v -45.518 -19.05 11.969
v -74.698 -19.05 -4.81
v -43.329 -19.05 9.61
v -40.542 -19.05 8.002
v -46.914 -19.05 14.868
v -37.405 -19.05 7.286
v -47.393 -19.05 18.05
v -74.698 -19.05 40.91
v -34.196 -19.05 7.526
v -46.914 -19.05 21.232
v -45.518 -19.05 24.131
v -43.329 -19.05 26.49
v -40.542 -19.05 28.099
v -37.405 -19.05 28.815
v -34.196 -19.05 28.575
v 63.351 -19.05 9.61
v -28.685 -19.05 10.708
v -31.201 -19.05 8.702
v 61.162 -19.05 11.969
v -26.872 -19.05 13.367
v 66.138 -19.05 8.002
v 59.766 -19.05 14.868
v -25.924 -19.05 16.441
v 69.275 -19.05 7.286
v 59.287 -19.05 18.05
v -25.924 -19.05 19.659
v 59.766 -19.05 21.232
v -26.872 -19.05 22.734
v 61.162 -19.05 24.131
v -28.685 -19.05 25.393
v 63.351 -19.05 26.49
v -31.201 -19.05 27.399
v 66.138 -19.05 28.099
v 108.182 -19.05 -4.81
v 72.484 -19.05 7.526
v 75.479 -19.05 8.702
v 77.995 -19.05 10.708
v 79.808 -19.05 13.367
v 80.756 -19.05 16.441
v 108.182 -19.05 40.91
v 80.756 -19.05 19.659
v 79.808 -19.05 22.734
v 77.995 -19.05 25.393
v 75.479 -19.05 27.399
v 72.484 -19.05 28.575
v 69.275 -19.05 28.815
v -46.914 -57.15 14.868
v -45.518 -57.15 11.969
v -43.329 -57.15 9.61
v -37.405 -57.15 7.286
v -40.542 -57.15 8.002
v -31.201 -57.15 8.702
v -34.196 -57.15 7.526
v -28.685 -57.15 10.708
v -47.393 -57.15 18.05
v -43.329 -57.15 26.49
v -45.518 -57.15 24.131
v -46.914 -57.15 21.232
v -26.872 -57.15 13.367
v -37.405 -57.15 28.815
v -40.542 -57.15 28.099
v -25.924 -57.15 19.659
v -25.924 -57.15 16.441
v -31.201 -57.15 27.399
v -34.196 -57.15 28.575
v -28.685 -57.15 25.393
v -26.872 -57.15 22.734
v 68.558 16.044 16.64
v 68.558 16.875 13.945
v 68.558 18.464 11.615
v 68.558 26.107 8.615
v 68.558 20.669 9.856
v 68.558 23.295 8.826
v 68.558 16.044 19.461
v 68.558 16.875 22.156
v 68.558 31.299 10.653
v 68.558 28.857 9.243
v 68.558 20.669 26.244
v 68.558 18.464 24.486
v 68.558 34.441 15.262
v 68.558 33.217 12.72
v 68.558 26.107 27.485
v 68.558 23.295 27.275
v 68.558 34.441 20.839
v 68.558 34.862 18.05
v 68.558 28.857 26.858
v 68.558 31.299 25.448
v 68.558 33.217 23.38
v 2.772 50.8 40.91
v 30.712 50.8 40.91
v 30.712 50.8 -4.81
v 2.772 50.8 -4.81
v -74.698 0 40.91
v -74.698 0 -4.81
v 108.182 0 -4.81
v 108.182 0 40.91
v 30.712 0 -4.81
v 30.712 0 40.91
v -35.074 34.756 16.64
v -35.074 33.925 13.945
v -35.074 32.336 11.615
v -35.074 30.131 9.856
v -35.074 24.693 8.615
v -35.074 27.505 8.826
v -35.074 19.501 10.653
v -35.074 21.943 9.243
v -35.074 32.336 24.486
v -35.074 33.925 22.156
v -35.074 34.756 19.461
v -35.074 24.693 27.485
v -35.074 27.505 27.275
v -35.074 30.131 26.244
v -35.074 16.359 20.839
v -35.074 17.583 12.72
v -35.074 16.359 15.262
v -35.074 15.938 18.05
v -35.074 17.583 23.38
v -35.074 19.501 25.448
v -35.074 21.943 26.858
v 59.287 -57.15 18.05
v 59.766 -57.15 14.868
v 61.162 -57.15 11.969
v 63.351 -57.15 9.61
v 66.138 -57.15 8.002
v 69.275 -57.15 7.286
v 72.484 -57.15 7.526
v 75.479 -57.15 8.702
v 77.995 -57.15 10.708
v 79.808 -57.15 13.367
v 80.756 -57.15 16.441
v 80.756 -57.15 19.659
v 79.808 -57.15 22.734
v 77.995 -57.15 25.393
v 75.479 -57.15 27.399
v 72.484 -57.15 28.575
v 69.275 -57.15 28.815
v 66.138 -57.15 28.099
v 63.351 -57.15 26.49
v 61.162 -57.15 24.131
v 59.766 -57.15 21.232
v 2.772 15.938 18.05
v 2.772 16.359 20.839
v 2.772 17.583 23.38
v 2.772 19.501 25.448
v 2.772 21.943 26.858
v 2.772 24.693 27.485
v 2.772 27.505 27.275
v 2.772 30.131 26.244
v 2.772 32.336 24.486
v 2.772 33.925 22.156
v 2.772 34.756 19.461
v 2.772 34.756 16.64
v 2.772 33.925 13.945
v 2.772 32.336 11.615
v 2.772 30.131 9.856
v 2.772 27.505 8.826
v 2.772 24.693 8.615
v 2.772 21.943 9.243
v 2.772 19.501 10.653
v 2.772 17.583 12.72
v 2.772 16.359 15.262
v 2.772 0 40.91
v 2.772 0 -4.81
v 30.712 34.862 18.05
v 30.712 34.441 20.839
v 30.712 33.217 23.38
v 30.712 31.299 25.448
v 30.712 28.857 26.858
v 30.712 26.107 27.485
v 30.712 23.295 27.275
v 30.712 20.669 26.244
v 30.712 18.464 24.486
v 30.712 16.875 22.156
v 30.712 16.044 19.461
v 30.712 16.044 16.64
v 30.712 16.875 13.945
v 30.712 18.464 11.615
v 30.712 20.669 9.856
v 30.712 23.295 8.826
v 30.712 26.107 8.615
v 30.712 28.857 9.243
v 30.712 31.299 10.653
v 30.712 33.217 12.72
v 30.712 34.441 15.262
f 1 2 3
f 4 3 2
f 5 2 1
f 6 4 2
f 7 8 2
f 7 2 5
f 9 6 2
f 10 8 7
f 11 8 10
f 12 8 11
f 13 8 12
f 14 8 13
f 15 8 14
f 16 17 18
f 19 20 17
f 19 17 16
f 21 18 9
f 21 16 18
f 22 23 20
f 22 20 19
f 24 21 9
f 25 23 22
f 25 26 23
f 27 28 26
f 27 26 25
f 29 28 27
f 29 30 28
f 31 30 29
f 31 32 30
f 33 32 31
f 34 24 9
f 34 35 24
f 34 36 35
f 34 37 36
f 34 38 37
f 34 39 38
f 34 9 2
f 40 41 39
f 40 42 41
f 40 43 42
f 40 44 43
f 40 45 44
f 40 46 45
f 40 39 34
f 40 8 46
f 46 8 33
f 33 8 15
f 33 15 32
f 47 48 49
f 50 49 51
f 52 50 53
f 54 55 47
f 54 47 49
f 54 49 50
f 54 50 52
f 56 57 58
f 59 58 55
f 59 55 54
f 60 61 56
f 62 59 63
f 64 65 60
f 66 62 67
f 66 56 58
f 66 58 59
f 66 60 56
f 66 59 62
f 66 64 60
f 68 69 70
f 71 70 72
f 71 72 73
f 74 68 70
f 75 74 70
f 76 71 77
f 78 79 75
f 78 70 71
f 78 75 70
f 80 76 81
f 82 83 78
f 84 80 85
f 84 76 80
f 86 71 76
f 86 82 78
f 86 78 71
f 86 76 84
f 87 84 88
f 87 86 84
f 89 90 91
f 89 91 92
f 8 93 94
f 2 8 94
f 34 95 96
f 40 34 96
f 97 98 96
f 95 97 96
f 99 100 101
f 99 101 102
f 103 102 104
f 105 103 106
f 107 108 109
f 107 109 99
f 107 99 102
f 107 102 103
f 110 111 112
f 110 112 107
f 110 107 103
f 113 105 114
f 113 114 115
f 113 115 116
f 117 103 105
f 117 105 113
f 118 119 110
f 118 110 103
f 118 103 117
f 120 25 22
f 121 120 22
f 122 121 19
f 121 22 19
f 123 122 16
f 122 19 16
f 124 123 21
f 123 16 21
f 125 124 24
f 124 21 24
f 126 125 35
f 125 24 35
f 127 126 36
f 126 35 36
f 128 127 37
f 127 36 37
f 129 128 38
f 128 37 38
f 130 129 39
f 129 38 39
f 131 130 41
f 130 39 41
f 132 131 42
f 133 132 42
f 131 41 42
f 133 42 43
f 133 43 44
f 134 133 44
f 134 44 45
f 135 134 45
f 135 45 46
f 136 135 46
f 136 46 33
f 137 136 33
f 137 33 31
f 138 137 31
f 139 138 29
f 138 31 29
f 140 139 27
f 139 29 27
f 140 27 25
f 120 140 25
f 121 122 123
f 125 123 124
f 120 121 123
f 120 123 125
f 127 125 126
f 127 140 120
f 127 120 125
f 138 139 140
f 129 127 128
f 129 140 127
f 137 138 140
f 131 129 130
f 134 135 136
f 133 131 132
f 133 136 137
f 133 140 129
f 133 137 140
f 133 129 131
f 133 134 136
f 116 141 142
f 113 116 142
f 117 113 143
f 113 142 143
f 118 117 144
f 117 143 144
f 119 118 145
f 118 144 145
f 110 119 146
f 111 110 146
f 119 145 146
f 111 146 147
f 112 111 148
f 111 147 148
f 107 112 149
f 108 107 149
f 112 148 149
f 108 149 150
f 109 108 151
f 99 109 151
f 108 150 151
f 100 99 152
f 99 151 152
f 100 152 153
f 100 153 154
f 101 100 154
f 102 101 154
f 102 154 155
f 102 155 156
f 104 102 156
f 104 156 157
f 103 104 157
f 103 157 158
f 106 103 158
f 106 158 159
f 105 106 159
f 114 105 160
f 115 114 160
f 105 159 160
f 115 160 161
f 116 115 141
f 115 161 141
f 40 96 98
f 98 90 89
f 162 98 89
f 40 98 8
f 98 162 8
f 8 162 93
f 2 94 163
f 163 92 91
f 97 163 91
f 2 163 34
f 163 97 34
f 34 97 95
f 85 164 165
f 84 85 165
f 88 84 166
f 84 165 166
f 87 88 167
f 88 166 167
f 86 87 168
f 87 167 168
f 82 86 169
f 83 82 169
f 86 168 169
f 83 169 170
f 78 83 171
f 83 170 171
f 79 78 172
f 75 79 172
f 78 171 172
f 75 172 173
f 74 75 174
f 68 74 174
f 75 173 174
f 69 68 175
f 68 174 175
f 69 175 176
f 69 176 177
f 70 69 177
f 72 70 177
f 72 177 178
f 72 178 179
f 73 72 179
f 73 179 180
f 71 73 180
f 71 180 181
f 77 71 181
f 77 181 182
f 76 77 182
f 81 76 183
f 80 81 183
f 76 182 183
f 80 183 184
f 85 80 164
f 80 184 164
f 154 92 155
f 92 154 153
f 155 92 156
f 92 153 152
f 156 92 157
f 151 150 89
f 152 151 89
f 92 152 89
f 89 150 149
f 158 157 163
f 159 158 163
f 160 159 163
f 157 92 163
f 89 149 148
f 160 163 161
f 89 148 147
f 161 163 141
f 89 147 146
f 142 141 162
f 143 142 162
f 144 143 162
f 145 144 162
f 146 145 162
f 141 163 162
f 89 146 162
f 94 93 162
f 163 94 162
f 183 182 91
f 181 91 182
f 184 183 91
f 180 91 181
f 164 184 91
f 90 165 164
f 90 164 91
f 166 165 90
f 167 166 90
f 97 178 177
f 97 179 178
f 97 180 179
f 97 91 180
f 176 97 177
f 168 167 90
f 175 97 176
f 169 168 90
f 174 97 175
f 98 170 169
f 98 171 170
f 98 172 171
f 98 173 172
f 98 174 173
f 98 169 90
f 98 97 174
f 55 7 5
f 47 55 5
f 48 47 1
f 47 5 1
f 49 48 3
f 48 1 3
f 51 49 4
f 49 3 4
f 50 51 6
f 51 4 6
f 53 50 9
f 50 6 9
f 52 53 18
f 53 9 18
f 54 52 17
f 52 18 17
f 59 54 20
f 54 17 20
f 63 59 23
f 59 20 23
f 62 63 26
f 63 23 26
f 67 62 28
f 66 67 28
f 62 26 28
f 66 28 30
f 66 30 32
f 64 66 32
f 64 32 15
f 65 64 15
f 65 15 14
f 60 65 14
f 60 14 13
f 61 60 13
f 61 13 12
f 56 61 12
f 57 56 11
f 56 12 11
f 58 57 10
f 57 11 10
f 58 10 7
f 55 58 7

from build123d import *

# Parameters (mm, degrees)
F0_W     = 27.94
F0_H     = 45.72
F1_DEPTH = 19.05
F2_W     = 27.94
F2_H     = 45.72
F3_DEPTH = 50.8
F5_R     = 9.4615
F6_DEPTH = 37.846
F7_DEPTH = 37.846
F9_DEPTH = 38.1


with BuildPart() as f1:
    # F0 (on Front) → F1 (new body)
    with BuildSketch(Plane.XZ):
        Polygon((-8.658381, 40.910337), (-74.698381, 40.910337), (-74.698381, -4.809663), (2.771619, -4.809663), (2.771619, 40.910337), align=None)
        with Locations((16.741619, 18.050337)):
            Rectangle(F0_W, F0_H)
        Polygon((42.141619, 40.910337), (30.711619, 40.910337), (30.711619, -4.809663), (108.181619, -4.809663), (108.181619, 40.910337), align=None)
    extrude(amount=F1_DEPTH)

    # F2 (on face) → F3 (join)
    with BuildSketch(Plane(origin=(0, 0, 0), x_dir=(-1, 0, 0), z_dir=(0, 1, 0))):
        with Locations((-16.741619, 18.050337)):
            Rectangle(F2_W, F2_H)
    extrude(amount=F3_DEPTH)

    # F5 (on face) → F6 (join)
    with BuildSketch(Plane.YZ.offset(30.711619)):
        with Locations((25.4, 18.050337)):
            Circle(F5_R)
    extrude(amount=F6_DEPTH)

    # F4 (on face) → F7 (join)
    with BuildSketch(Plane(origin=(2.771619, 0, 0), x_dir=(0, -1, 0), z_dir=(-1, 0, 0))):
        with BuildLine():
            ThreePointArc((-34.8615, 18.050337), (-25.4, 8.588837), (-15.9385, 18.050337))
            ThreePointArc((-15.9385, 18.050337), (-25.4, 27.511837), (-34.8615, 18.050337))
        make_face()
    extrude(amount=F7_DEPTH)

    # F8 (on face) → F9 (join)
    with BuildSketch(Plane.XZ.offset(19.05)):
        with BuildLine():
            Line((-47.393381, 18.050337), (-36.598381, 18.050337))
            Line((-36.598381, 18.050337), (-25.803381, 18.050337))
            ThreePointArc((-25.803381, 18.050337), (-36.598381, 28.845337), (-47.393381, 18.050337))
        make_face()
        with BuildLine():
            Line((-25.803381, 18.050337), (-36.598381, 18.050337))
            Line((-36.598381, 18.050337), (-47.393381, 18.050337))
            ThreePointArc((-47.393381, 18.050337), (-36.598381, 7.255337), (-25.803381, 18.050337))
        make_face()
        with BuildLine():
            ThreePointArc((80.876619, 18.050337), (70.081619, 28.845337), (59.286619, 18.050337))
            Line((59.286619, 18.050337), (70.081619, 18.050337))
            Line((70.081619, 18.050337), (80.876619, 18.050337))
        make_face()
        with BuildLine():
            Line((70.081619, 18.050337), (59.286619, 18.050337))
            ThreePointArc((59.286619, 18.050337), (70.081619, 7.255337), (80.876619, 18.050337))
            Line((80.876619, 18.050337), (70.081619, 18.050337))
        make_face()
    extrude(amount=F9_DEPTH)


solid = f1.part
